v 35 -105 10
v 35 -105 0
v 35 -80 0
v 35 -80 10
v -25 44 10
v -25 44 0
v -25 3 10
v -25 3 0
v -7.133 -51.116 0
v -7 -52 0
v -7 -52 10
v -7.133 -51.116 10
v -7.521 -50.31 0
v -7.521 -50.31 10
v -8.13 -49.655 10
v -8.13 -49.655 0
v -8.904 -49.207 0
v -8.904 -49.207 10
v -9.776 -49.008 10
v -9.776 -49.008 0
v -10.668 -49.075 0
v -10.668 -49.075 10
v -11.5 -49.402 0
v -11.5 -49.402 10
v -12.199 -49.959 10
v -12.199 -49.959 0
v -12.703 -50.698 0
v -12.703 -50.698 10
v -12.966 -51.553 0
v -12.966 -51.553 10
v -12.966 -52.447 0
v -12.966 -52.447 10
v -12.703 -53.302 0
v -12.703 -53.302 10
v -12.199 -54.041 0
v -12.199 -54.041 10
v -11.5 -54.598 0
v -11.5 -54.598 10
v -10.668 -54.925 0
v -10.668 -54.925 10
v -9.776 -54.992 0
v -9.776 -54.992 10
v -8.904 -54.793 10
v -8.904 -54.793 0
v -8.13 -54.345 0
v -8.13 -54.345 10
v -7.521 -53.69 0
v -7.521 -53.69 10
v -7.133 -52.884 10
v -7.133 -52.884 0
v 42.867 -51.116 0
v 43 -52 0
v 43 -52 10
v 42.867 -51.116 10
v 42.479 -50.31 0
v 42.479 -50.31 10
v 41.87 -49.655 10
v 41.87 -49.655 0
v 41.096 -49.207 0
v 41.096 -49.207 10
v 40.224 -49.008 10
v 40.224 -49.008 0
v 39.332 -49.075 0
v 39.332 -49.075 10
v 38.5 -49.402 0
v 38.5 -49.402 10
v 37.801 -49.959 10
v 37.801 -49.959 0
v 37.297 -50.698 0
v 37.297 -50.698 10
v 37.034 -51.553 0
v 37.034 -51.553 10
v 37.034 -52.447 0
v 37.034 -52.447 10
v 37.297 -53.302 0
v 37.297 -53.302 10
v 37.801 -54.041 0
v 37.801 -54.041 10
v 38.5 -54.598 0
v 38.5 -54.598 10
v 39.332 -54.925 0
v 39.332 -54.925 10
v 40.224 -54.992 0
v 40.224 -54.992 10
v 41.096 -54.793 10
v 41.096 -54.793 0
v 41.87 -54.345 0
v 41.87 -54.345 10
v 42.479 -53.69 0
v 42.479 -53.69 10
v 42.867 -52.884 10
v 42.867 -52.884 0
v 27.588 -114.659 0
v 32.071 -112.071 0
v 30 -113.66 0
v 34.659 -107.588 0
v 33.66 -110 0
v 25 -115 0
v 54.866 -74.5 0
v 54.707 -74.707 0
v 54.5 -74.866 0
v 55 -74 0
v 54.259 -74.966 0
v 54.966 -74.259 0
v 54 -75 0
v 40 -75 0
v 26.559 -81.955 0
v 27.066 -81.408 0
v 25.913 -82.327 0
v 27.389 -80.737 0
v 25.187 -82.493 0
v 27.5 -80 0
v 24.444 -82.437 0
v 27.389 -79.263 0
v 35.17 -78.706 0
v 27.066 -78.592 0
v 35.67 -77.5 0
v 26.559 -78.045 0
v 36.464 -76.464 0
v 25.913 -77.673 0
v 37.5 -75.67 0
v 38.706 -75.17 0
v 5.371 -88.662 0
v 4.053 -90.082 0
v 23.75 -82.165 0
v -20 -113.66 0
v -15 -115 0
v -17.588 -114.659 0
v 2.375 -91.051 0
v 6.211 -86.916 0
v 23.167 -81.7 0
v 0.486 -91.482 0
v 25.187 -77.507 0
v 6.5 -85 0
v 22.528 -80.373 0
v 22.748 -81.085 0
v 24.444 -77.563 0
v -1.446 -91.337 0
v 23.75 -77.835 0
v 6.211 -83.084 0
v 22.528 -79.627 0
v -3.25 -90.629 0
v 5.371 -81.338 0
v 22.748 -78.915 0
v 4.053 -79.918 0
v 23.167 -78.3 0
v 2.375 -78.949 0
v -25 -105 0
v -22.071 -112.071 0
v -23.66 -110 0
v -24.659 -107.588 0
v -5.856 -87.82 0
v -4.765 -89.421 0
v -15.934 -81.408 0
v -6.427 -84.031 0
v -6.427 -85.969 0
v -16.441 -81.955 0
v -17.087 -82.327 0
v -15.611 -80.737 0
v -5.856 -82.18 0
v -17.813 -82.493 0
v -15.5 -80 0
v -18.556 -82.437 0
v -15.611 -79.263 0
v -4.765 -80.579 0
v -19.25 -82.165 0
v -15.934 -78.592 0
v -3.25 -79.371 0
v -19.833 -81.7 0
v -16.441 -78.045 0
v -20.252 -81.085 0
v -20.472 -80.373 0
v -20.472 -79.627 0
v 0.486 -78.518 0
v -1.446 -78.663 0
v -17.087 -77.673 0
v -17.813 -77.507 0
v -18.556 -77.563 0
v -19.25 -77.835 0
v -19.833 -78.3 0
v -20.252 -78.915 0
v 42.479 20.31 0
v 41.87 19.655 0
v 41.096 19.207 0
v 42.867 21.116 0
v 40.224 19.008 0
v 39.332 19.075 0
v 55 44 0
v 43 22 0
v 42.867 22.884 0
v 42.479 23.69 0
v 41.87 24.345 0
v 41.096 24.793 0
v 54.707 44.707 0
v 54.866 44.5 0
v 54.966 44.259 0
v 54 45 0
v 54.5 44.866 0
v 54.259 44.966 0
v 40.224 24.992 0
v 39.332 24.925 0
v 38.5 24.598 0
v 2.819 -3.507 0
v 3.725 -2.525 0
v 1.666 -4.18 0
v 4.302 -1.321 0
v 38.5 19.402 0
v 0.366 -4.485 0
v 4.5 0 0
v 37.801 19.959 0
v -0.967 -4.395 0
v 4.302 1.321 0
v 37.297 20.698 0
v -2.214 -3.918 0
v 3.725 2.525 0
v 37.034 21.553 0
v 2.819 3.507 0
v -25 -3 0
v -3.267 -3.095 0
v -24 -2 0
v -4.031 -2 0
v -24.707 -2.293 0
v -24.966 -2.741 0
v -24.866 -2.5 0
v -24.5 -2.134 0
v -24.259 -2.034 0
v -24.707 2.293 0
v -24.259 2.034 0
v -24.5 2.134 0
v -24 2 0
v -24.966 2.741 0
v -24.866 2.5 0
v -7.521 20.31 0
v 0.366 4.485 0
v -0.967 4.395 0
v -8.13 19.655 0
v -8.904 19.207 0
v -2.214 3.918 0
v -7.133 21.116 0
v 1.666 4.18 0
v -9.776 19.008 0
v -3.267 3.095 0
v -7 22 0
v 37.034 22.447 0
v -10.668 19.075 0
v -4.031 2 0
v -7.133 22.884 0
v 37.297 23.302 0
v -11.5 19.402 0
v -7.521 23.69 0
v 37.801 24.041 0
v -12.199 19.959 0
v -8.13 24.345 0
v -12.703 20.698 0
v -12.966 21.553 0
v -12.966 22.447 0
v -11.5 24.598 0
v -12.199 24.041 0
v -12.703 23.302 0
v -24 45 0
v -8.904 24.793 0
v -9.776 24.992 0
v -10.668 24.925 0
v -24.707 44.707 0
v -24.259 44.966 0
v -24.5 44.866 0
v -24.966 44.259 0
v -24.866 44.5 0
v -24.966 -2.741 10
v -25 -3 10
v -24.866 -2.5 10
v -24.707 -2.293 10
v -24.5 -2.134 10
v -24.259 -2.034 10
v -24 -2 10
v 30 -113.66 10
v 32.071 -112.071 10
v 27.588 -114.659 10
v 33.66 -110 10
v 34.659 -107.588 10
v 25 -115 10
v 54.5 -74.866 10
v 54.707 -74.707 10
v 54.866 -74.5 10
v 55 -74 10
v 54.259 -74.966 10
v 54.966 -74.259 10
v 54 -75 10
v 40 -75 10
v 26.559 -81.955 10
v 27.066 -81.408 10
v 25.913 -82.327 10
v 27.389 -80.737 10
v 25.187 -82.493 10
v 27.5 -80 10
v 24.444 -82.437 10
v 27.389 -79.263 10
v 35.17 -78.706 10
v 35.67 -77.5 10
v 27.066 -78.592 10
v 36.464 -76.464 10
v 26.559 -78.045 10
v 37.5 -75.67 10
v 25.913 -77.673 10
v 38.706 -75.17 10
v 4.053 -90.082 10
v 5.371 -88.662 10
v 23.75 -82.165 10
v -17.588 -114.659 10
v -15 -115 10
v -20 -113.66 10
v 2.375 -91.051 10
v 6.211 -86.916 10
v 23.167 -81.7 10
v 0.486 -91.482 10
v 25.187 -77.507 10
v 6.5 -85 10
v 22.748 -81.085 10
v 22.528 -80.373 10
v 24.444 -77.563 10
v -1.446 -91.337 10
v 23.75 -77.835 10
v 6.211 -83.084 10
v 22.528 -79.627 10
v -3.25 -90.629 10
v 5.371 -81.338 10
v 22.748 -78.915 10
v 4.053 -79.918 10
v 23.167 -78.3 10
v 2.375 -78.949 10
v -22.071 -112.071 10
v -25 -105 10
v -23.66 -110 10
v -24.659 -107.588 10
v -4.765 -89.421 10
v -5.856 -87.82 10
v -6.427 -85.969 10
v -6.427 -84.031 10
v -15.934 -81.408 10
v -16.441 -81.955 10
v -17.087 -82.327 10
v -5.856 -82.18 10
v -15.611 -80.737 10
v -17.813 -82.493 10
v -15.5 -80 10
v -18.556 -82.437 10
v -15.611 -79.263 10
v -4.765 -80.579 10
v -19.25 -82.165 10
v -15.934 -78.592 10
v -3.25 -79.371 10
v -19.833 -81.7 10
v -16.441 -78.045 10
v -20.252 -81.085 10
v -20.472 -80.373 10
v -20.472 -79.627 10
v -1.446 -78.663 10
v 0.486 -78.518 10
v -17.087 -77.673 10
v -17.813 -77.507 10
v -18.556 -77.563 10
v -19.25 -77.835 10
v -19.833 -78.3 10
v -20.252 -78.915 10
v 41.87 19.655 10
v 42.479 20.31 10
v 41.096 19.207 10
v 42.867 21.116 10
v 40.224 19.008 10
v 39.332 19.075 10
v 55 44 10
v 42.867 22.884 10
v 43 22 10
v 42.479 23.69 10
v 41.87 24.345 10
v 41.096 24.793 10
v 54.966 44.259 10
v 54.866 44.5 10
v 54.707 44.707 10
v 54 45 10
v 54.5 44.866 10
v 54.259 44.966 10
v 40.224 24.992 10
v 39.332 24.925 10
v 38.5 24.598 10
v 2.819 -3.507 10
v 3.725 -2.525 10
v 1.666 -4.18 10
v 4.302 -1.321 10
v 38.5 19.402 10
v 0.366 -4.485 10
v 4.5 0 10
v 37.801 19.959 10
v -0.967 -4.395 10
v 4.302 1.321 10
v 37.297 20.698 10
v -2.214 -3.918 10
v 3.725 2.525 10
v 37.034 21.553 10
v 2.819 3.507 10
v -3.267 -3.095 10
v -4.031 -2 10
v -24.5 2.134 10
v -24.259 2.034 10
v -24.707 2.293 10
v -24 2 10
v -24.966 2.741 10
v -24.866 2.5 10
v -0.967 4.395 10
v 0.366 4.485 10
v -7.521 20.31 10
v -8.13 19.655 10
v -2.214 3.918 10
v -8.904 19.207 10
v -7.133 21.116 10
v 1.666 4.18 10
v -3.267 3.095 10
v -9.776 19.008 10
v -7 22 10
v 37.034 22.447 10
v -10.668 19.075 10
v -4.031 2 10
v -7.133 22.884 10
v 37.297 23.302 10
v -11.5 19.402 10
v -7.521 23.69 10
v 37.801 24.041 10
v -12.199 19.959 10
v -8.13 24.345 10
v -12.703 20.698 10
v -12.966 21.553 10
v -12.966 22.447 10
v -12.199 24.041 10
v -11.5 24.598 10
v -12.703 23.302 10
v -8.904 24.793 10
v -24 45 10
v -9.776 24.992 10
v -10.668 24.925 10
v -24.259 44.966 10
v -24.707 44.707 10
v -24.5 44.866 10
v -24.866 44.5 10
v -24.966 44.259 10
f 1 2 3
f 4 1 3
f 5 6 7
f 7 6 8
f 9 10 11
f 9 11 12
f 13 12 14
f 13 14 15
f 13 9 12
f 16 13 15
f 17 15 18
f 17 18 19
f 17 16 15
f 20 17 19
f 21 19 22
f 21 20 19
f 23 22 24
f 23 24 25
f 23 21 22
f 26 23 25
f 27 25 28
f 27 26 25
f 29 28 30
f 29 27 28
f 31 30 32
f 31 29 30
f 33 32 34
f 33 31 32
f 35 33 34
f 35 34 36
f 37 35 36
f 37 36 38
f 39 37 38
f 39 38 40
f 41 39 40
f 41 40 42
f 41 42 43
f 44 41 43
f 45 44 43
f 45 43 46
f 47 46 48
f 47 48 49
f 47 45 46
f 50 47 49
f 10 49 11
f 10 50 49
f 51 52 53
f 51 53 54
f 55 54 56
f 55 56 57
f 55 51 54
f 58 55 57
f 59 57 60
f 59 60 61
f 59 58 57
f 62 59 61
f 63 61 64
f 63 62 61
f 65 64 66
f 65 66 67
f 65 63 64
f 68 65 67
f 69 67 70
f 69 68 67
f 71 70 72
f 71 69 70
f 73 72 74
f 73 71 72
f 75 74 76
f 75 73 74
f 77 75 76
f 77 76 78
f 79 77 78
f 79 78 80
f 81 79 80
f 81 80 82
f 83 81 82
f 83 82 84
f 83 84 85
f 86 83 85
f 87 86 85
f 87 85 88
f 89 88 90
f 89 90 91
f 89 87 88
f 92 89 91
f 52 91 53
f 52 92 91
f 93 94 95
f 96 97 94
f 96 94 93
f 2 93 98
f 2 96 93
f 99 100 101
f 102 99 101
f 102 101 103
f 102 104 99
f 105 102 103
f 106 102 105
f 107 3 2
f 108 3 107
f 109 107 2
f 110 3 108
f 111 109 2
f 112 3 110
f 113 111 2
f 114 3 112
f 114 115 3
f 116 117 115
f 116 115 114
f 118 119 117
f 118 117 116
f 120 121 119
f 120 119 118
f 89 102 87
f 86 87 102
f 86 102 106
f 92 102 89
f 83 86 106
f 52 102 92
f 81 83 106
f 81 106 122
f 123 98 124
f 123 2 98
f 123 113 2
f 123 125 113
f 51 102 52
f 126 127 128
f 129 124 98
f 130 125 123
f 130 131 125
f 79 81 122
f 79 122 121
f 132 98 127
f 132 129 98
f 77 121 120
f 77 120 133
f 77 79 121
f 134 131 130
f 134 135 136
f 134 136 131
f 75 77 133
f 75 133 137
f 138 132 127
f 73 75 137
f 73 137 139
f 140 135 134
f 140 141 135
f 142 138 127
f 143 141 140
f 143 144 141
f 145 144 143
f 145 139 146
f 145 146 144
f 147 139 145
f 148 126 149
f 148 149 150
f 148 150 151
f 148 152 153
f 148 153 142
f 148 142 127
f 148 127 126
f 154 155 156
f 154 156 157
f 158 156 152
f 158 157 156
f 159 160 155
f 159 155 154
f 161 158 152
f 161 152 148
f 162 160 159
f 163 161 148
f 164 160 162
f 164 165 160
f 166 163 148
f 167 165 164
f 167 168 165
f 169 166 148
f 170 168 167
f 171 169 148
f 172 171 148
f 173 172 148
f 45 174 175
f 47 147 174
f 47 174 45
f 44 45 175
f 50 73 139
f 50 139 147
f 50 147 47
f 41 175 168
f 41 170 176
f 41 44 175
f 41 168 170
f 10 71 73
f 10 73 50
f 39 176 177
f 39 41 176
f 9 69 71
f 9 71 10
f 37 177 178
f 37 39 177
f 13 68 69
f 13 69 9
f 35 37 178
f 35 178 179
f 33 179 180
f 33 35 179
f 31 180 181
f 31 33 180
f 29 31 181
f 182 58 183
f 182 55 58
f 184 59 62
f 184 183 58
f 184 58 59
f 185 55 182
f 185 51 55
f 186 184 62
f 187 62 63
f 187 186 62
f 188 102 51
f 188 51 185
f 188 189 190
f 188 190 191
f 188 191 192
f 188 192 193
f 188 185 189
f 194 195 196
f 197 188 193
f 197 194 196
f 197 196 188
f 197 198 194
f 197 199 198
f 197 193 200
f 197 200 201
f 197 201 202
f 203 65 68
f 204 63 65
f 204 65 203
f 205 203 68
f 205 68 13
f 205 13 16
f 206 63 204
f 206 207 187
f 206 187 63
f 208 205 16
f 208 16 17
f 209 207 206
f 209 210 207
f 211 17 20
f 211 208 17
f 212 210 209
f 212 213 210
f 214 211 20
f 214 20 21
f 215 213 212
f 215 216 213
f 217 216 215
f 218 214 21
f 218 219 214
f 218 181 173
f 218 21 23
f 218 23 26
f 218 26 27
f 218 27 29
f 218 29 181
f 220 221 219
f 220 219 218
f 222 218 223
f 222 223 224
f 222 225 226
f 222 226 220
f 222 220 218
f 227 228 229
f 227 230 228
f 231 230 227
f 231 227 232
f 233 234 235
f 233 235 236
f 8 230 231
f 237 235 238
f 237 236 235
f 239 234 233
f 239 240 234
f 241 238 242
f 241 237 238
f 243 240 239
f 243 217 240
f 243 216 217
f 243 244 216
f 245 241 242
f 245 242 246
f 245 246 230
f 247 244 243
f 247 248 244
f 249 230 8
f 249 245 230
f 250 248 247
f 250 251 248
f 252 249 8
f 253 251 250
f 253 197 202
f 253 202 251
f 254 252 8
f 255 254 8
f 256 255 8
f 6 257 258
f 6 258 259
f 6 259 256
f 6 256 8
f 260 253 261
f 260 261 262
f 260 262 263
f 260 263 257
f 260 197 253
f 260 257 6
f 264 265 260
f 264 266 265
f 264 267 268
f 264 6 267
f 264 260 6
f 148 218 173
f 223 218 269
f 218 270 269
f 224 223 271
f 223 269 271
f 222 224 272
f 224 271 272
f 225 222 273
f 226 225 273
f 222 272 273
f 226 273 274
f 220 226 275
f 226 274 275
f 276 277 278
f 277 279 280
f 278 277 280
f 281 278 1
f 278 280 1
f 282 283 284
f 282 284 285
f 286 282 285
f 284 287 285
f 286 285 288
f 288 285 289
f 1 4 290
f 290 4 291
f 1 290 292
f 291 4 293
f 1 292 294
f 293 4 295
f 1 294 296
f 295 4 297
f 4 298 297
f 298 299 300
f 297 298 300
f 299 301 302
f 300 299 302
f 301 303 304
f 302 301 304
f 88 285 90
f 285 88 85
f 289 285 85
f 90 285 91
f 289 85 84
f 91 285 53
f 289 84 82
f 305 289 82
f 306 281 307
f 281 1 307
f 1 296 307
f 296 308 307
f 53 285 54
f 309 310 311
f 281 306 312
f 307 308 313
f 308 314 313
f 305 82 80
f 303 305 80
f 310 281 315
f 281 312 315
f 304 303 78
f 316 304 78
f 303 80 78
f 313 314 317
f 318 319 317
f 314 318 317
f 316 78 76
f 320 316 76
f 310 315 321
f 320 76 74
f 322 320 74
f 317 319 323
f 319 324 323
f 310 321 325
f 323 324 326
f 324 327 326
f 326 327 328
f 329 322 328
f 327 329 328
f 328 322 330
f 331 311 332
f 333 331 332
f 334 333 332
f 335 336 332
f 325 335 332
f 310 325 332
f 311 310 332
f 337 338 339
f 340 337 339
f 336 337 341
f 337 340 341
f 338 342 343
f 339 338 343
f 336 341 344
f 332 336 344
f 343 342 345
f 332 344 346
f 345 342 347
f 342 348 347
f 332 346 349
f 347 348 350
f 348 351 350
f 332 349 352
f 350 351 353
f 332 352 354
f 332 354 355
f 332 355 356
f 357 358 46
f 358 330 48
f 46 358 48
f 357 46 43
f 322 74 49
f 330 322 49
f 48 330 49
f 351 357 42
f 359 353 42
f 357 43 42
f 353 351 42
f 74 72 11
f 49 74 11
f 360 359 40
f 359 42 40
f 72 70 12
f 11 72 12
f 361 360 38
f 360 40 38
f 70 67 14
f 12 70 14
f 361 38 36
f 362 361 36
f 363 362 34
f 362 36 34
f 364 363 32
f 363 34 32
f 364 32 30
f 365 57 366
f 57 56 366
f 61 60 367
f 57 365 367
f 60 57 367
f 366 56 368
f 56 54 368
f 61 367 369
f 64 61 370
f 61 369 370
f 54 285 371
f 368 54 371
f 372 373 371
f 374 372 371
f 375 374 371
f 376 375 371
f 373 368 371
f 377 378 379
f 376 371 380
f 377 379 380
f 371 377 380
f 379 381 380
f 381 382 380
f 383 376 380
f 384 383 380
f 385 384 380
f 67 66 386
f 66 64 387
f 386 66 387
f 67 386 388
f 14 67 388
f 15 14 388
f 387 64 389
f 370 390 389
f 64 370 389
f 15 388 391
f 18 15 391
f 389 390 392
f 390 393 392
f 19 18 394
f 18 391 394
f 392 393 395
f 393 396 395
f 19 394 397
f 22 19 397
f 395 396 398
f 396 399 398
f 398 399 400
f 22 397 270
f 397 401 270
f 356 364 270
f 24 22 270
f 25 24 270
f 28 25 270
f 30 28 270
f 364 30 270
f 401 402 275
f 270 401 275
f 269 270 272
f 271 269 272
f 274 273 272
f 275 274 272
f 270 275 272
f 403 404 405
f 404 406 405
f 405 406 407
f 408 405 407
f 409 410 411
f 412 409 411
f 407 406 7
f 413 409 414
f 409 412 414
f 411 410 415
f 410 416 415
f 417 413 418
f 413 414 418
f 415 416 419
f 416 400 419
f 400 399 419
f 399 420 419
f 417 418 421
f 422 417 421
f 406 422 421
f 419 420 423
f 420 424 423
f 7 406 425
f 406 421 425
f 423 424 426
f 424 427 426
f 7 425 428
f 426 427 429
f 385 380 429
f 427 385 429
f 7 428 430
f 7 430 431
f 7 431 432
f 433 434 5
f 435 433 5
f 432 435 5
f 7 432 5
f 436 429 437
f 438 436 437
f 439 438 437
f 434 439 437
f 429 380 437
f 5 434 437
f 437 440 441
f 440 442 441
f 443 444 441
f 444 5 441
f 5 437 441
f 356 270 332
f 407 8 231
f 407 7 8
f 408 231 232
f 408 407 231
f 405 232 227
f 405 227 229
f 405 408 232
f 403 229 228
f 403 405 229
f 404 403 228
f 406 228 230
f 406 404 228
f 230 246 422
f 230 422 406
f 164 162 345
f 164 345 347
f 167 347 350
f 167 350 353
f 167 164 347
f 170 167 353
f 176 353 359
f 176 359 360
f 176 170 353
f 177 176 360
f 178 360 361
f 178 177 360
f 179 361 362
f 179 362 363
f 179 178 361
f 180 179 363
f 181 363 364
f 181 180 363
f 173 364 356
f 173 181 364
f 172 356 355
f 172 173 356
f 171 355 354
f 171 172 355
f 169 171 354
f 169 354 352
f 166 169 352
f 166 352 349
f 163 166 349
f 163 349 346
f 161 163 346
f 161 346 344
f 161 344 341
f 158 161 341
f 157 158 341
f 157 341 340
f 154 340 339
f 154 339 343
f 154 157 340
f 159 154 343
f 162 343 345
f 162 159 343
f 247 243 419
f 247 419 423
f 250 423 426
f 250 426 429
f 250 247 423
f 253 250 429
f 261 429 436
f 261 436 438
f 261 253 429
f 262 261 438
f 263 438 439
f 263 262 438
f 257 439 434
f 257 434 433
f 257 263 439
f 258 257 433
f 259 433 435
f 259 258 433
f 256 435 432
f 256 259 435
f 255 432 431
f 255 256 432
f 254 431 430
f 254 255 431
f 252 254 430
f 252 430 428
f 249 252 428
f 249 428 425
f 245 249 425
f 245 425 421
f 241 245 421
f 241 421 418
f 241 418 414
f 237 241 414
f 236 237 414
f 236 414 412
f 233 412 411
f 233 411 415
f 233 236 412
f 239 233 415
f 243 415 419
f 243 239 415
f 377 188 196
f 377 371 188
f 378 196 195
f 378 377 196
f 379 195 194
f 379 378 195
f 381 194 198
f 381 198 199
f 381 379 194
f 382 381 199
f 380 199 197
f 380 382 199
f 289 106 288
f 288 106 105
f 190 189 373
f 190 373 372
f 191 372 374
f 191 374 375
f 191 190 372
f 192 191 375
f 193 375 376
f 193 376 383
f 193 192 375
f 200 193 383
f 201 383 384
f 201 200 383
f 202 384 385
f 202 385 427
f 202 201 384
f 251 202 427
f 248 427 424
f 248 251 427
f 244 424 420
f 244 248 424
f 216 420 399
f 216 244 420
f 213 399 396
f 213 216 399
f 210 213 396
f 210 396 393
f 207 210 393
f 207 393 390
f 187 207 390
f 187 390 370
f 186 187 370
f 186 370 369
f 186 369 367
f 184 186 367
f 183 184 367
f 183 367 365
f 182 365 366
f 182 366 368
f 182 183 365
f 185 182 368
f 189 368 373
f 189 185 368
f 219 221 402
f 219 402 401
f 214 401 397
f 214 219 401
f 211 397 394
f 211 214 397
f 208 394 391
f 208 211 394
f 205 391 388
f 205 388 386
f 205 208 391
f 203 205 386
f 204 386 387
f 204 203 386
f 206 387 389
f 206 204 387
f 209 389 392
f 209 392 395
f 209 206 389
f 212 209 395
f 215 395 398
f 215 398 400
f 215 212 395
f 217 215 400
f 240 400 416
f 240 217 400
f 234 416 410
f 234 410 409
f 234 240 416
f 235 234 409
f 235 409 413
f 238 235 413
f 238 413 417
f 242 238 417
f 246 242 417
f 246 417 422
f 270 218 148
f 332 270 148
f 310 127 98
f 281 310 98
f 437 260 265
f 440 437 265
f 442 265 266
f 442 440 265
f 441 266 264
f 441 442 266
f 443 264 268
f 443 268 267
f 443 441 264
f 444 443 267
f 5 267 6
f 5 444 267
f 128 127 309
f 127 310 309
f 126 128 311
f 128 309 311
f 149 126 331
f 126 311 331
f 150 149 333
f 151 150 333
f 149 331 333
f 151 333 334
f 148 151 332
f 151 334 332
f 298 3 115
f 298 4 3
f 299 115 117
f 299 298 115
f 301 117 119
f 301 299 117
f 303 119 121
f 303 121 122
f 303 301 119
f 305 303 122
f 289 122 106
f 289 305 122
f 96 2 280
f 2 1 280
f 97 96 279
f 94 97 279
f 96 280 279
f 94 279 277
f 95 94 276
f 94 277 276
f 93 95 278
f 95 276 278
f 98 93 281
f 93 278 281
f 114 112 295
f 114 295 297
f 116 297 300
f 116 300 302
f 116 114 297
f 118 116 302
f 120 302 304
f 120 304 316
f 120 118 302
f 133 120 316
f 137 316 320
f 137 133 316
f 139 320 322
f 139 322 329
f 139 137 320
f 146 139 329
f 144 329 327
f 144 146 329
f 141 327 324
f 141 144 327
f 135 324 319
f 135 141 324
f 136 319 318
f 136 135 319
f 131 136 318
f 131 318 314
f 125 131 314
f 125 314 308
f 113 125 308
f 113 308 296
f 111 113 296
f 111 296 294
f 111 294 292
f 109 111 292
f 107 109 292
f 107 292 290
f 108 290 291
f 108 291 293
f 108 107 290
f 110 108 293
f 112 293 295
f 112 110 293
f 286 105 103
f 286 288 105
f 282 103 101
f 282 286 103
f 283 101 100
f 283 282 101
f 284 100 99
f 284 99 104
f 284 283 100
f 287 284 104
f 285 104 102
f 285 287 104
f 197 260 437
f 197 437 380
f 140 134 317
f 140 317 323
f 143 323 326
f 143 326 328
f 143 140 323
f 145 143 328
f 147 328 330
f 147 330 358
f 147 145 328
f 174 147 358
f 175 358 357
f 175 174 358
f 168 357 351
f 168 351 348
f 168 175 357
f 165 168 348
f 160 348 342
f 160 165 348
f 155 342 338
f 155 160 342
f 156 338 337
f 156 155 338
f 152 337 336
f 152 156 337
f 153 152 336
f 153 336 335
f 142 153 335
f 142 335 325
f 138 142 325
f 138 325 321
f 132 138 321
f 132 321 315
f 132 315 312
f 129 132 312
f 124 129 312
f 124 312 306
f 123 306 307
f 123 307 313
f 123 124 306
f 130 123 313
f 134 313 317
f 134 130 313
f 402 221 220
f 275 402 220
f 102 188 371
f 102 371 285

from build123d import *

# Parameters (mm, degrees)
SKETCH_R    = 3
SKETCH_R_2  = 2.5
SKETCH_R_3  = 6.5
PAD_DEPTH   = 10
FILLET_R    = 5
FILLET001_R = 1
FILLET002_R = 10


with BuildPart() as part:
    # Sketch → Pad (new body)
    with BuildSketch(Plane.XY):
        with BuildLine():
            ThreePointArc((-4.031129, -2), (4.5, 0), (-4.031129, 2))
            Line((-4.031129, 2), (-25, 2))
            Line((-25, 45), (-25, 2))
            Line((-25, 45), (55, 45))
            Line((55, 45), (55, -75))
            Line((35, -75), (55, -75))
            Line((35, -115), (35, -75))
            Line((-25, -115), (35, -115))
            Line((-25, -2), (-25, -115))
            Line((-4.031129, -2), (-25, -2))
        make_face()
        with Locations((-10, -52)):
            Circle(SKETCH_R, mode=Mode.SUBTRACT)
        with Locations((40, -52)):
            Circle(SKETCH_R, mode=Mode.SUBTRACT)
        with Locations((40, 22)):
            Circle(SKETCH_R, mode=Mode.SUBTRACT)
        with Locations((-10, 22)):
            Circle(SKETCH_R, mode=Mode.SUBTRACT)
        with Locations((25, -80)):
            Circle(SKETCH_R_2, mode=Mode.SUBTRACT)
        with Locations((-18, -80)):
            Circle(SKETCH_R_2, mode=Mode.SUBTRACT)
        with Locations((0, -85)):
            Circle(SKETCH_R_3, mode=Mode.SUBTRACT)
    extrude(amount=PAD_DEPTH)

    # Fillet
    fillet_edges = [part.edges().sort_by_distance(p)[0] for p in [
        (35, -75, 5),
    ]]
    fillet(fillet_edges, radius=FILLET_R)

    # Fillet001
    fillet001_edges = [part.edges().sort_by_distance(p)[0] for p in [
        (55, -75, 5),
        (55, 45, 5),
        (-25, 2, 5),
        (-25, -2, 5),
        (-25, 45, 5),
    ]]
    fillet(fillet001_edges, radius=FILLET001_R)

    # Fillet002
    fillet002_edges = [part.edges().sort_by_distance(p)[0] for p in [
        (-25, -115, 5),
        (35, -115, 5),
    ]]
    fillet(fillet002_edges, radius=FILLET002_R)


solid = part.part
